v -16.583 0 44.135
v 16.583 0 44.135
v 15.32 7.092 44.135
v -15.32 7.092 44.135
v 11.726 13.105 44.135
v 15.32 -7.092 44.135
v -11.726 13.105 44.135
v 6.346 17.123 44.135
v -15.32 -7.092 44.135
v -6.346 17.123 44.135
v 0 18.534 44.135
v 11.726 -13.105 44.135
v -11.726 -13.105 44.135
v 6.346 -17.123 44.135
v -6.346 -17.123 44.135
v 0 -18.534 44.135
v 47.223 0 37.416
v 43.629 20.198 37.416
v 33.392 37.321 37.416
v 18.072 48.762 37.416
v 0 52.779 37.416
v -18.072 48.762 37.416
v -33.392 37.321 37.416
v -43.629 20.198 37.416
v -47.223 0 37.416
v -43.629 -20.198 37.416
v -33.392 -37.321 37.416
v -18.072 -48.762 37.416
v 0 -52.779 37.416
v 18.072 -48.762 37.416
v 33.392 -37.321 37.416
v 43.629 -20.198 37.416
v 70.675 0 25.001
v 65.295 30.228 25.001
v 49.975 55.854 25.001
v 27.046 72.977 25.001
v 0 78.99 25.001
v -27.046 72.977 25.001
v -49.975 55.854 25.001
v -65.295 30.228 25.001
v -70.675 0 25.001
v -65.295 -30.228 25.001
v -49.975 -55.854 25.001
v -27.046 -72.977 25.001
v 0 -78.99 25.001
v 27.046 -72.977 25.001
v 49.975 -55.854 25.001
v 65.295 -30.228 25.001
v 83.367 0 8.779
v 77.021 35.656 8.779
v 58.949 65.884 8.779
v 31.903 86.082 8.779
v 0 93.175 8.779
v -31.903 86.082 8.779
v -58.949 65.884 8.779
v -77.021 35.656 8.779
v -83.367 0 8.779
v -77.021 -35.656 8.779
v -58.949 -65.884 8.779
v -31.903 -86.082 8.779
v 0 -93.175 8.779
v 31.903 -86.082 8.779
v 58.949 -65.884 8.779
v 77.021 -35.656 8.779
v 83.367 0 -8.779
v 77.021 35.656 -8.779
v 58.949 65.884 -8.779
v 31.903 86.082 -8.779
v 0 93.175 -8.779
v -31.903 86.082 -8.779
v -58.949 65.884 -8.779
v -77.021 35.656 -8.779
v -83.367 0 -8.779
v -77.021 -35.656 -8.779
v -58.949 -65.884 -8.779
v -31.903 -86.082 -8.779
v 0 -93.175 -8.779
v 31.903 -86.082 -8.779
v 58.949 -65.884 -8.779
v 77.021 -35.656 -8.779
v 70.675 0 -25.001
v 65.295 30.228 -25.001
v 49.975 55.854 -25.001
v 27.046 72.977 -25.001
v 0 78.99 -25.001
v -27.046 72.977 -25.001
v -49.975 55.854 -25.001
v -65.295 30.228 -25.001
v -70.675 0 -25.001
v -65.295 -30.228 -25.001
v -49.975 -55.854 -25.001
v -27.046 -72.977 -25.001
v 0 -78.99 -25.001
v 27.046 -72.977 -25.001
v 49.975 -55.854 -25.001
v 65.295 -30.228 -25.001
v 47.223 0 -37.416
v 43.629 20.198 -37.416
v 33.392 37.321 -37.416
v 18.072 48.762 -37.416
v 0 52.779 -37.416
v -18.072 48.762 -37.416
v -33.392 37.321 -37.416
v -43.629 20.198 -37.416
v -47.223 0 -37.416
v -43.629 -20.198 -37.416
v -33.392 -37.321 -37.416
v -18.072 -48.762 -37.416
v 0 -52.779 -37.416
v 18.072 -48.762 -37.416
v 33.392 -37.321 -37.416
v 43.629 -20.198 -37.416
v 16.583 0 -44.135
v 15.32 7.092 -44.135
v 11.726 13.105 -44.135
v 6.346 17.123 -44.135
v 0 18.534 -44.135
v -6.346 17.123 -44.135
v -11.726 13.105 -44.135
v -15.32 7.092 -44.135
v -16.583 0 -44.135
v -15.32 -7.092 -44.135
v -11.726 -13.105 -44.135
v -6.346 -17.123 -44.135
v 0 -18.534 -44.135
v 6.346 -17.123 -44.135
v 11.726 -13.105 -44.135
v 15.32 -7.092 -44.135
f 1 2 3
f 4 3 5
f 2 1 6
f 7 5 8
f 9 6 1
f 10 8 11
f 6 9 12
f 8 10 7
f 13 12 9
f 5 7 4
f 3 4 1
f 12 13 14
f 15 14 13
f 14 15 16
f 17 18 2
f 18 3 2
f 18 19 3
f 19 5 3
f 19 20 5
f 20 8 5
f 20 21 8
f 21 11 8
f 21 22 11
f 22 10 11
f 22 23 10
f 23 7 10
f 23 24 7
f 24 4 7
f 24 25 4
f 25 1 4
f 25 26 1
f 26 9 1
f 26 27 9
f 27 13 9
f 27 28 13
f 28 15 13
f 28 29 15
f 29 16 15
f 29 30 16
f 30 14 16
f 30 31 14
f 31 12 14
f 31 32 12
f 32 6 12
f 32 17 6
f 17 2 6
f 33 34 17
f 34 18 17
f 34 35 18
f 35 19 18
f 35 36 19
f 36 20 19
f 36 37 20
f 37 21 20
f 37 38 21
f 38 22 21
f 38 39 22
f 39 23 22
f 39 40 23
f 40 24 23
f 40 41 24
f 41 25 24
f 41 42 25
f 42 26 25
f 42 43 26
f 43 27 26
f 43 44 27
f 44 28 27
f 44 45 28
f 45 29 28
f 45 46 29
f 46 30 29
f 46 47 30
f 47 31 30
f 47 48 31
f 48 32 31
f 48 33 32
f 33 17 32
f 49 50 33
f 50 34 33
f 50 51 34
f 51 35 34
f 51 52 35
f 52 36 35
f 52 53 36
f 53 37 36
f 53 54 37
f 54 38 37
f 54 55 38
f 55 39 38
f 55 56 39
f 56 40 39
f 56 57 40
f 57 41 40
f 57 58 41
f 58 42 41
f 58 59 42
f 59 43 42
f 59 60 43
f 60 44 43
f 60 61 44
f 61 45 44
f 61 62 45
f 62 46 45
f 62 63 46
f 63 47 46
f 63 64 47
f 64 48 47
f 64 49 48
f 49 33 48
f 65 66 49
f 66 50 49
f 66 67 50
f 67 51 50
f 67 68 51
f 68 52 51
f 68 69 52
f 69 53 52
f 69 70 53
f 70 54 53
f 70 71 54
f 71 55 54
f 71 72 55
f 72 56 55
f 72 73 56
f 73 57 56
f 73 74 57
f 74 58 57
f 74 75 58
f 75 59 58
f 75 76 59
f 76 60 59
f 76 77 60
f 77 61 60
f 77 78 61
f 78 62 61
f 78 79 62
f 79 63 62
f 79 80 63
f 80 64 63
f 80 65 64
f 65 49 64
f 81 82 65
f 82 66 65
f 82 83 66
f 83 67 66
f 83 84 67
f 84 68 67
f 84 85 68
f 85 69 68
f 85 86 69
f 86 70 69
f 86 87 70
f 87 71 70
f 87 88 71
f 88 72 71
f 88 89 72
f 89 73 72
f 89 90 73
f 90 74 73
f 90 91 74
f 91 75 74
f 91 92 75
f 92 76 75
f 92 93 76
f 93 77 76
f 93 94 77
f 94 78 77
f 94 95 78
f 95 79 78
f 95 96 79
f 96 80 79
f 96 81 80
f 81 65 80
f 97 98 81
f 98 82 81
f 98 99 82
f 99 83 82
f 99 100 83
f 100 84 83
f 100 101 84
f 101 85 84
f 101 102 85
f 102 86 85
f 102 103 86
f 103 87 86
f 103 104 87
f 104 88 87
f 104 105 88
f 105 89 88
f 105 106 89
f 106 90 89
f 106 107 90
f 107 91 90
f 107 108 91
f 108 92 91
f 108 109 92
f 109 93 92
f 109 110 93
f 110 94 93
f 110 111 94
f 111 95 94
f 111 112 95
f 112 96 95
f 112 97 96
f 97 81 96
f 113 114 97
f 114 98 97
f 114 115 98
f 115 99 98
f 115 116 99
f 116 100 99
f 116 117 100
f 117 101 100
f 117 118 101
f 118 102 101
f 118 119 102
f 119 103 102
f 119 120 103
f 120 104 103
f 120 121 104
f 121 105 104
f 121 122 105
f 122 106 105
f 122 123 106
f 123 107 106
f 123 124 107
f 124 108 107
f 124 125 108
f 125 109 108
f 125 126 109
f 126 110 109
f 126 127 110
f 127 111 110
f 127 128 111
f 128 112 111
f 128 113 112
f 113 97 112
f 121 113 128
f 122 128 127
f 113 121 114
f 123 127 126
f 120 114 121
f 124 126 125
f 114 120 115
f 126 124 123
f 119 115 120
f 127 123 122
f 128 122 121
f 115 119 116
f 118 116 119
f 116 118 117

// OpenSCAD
// Generated by SolidPython 1.0.1 on 2020-07-29 00:46:53


scale(v = [17, 19, 9]) {
	sphere(r = 5);
}
/***********************************************
*********      SolidPython code:      **********
************************************************
 
# import packages: SolidPython
from solid import *
from solid.utils import *
from itertools import chain, combinations, permutations


class Resize:

    def __init__(self, scad_file):
        self.scad_file = scad_file
        #self.scad_file = import_scad(scad_file)
        # cone/cylinder param:
        self.r1 = 0
        self.r2 = 0
        self.h = 0
        # rectangular prism param:
        self.w = 0
        self.l = 0
        # ellipse param:
        self.r = 0

    # import OpenScad code (file name corresponds to shape)


    # classify shape + parameters
    def assign(self, param1, param2, param3):
        if self.scad_file == 'cone.scad':
            self.r1 = param1
            self.r2 = param2
            self.h = param3
        elif self.scad_file == 'cylinder.scad':
            self.r1 = param1
            self.r2 = param2
            self.h = param3
        elif self.scad_file == 'rectangularPrism.scad':
            self.h = param1
            self.l = param2
            self.w = param3
        else:
            self.r = param1
            self.h = param2

    # resize parameters
    def iterate(self):
        x = range(3, 20, 2)
        i = 1
        if self.scad_file == 'cone.scad':
            tempList = list(permutations(x, 2))
            for temp in tempList:
                param1 = temp[0]
                param2 = temp[1]
                filepath = 'produced_scad_files/' + 'cone' + str(param1) + '_' + str(param2) + '_' + '.scad'
                scad_render_to_file(cylinder(h=param1, r1=param2, r2=0), filepath)

        elif self.scad_file == 'cylinder.scad':
            tempList = list(permutations(x, 3))
            for temp in tempList:
                param1 = temp[0]
                param2 = temp[1]
                filepath = 'produced_scad_files/' + 'cylinder' + str(param1) + '_' + str(param2) + '_' + '.scad'
                scad_render_to_file(cylinder(h=param1, r1=param2, r2=param2), filepath)

        elif self.scad_file == 'rectangularPrism.scad':
            tempList = list(permutations(x, 3))
            for temp in tempList:
                param1 = temp[0]
                param2 = temp[1]
                param3 = temp[2]
                filepath = 'produced_scad_files/' + 'rectangularPrism' + str(param1) + '_' + str(param2) + '_' + str(
                    param3) + '.scad'
                scad_render_to_file(cube(size=(param1, param2, param3)), filepath)

        elif self.scad_file == 'ellipse.scad':
            tempList = list(permutations(x, 4))
            for temp in tempList:
                param1 = temp[0]
                param2 = temp[1]
                param3 = temp[2]
                param4 = temp[3]
                filepath = 'produced_scad_files/' + 'ellipse' + str(param1) + '_' + str(param2) + '_' + str(param3) + '_' + str(param4) + '.scad'
                scad_render_to_file(scale([param1, param2, param3])(sphere(r=param4)), filepath)

    def render_to_scadfile(self):
        scad_render_to_file(scad, 'example.scad') 
 
************************************************/
